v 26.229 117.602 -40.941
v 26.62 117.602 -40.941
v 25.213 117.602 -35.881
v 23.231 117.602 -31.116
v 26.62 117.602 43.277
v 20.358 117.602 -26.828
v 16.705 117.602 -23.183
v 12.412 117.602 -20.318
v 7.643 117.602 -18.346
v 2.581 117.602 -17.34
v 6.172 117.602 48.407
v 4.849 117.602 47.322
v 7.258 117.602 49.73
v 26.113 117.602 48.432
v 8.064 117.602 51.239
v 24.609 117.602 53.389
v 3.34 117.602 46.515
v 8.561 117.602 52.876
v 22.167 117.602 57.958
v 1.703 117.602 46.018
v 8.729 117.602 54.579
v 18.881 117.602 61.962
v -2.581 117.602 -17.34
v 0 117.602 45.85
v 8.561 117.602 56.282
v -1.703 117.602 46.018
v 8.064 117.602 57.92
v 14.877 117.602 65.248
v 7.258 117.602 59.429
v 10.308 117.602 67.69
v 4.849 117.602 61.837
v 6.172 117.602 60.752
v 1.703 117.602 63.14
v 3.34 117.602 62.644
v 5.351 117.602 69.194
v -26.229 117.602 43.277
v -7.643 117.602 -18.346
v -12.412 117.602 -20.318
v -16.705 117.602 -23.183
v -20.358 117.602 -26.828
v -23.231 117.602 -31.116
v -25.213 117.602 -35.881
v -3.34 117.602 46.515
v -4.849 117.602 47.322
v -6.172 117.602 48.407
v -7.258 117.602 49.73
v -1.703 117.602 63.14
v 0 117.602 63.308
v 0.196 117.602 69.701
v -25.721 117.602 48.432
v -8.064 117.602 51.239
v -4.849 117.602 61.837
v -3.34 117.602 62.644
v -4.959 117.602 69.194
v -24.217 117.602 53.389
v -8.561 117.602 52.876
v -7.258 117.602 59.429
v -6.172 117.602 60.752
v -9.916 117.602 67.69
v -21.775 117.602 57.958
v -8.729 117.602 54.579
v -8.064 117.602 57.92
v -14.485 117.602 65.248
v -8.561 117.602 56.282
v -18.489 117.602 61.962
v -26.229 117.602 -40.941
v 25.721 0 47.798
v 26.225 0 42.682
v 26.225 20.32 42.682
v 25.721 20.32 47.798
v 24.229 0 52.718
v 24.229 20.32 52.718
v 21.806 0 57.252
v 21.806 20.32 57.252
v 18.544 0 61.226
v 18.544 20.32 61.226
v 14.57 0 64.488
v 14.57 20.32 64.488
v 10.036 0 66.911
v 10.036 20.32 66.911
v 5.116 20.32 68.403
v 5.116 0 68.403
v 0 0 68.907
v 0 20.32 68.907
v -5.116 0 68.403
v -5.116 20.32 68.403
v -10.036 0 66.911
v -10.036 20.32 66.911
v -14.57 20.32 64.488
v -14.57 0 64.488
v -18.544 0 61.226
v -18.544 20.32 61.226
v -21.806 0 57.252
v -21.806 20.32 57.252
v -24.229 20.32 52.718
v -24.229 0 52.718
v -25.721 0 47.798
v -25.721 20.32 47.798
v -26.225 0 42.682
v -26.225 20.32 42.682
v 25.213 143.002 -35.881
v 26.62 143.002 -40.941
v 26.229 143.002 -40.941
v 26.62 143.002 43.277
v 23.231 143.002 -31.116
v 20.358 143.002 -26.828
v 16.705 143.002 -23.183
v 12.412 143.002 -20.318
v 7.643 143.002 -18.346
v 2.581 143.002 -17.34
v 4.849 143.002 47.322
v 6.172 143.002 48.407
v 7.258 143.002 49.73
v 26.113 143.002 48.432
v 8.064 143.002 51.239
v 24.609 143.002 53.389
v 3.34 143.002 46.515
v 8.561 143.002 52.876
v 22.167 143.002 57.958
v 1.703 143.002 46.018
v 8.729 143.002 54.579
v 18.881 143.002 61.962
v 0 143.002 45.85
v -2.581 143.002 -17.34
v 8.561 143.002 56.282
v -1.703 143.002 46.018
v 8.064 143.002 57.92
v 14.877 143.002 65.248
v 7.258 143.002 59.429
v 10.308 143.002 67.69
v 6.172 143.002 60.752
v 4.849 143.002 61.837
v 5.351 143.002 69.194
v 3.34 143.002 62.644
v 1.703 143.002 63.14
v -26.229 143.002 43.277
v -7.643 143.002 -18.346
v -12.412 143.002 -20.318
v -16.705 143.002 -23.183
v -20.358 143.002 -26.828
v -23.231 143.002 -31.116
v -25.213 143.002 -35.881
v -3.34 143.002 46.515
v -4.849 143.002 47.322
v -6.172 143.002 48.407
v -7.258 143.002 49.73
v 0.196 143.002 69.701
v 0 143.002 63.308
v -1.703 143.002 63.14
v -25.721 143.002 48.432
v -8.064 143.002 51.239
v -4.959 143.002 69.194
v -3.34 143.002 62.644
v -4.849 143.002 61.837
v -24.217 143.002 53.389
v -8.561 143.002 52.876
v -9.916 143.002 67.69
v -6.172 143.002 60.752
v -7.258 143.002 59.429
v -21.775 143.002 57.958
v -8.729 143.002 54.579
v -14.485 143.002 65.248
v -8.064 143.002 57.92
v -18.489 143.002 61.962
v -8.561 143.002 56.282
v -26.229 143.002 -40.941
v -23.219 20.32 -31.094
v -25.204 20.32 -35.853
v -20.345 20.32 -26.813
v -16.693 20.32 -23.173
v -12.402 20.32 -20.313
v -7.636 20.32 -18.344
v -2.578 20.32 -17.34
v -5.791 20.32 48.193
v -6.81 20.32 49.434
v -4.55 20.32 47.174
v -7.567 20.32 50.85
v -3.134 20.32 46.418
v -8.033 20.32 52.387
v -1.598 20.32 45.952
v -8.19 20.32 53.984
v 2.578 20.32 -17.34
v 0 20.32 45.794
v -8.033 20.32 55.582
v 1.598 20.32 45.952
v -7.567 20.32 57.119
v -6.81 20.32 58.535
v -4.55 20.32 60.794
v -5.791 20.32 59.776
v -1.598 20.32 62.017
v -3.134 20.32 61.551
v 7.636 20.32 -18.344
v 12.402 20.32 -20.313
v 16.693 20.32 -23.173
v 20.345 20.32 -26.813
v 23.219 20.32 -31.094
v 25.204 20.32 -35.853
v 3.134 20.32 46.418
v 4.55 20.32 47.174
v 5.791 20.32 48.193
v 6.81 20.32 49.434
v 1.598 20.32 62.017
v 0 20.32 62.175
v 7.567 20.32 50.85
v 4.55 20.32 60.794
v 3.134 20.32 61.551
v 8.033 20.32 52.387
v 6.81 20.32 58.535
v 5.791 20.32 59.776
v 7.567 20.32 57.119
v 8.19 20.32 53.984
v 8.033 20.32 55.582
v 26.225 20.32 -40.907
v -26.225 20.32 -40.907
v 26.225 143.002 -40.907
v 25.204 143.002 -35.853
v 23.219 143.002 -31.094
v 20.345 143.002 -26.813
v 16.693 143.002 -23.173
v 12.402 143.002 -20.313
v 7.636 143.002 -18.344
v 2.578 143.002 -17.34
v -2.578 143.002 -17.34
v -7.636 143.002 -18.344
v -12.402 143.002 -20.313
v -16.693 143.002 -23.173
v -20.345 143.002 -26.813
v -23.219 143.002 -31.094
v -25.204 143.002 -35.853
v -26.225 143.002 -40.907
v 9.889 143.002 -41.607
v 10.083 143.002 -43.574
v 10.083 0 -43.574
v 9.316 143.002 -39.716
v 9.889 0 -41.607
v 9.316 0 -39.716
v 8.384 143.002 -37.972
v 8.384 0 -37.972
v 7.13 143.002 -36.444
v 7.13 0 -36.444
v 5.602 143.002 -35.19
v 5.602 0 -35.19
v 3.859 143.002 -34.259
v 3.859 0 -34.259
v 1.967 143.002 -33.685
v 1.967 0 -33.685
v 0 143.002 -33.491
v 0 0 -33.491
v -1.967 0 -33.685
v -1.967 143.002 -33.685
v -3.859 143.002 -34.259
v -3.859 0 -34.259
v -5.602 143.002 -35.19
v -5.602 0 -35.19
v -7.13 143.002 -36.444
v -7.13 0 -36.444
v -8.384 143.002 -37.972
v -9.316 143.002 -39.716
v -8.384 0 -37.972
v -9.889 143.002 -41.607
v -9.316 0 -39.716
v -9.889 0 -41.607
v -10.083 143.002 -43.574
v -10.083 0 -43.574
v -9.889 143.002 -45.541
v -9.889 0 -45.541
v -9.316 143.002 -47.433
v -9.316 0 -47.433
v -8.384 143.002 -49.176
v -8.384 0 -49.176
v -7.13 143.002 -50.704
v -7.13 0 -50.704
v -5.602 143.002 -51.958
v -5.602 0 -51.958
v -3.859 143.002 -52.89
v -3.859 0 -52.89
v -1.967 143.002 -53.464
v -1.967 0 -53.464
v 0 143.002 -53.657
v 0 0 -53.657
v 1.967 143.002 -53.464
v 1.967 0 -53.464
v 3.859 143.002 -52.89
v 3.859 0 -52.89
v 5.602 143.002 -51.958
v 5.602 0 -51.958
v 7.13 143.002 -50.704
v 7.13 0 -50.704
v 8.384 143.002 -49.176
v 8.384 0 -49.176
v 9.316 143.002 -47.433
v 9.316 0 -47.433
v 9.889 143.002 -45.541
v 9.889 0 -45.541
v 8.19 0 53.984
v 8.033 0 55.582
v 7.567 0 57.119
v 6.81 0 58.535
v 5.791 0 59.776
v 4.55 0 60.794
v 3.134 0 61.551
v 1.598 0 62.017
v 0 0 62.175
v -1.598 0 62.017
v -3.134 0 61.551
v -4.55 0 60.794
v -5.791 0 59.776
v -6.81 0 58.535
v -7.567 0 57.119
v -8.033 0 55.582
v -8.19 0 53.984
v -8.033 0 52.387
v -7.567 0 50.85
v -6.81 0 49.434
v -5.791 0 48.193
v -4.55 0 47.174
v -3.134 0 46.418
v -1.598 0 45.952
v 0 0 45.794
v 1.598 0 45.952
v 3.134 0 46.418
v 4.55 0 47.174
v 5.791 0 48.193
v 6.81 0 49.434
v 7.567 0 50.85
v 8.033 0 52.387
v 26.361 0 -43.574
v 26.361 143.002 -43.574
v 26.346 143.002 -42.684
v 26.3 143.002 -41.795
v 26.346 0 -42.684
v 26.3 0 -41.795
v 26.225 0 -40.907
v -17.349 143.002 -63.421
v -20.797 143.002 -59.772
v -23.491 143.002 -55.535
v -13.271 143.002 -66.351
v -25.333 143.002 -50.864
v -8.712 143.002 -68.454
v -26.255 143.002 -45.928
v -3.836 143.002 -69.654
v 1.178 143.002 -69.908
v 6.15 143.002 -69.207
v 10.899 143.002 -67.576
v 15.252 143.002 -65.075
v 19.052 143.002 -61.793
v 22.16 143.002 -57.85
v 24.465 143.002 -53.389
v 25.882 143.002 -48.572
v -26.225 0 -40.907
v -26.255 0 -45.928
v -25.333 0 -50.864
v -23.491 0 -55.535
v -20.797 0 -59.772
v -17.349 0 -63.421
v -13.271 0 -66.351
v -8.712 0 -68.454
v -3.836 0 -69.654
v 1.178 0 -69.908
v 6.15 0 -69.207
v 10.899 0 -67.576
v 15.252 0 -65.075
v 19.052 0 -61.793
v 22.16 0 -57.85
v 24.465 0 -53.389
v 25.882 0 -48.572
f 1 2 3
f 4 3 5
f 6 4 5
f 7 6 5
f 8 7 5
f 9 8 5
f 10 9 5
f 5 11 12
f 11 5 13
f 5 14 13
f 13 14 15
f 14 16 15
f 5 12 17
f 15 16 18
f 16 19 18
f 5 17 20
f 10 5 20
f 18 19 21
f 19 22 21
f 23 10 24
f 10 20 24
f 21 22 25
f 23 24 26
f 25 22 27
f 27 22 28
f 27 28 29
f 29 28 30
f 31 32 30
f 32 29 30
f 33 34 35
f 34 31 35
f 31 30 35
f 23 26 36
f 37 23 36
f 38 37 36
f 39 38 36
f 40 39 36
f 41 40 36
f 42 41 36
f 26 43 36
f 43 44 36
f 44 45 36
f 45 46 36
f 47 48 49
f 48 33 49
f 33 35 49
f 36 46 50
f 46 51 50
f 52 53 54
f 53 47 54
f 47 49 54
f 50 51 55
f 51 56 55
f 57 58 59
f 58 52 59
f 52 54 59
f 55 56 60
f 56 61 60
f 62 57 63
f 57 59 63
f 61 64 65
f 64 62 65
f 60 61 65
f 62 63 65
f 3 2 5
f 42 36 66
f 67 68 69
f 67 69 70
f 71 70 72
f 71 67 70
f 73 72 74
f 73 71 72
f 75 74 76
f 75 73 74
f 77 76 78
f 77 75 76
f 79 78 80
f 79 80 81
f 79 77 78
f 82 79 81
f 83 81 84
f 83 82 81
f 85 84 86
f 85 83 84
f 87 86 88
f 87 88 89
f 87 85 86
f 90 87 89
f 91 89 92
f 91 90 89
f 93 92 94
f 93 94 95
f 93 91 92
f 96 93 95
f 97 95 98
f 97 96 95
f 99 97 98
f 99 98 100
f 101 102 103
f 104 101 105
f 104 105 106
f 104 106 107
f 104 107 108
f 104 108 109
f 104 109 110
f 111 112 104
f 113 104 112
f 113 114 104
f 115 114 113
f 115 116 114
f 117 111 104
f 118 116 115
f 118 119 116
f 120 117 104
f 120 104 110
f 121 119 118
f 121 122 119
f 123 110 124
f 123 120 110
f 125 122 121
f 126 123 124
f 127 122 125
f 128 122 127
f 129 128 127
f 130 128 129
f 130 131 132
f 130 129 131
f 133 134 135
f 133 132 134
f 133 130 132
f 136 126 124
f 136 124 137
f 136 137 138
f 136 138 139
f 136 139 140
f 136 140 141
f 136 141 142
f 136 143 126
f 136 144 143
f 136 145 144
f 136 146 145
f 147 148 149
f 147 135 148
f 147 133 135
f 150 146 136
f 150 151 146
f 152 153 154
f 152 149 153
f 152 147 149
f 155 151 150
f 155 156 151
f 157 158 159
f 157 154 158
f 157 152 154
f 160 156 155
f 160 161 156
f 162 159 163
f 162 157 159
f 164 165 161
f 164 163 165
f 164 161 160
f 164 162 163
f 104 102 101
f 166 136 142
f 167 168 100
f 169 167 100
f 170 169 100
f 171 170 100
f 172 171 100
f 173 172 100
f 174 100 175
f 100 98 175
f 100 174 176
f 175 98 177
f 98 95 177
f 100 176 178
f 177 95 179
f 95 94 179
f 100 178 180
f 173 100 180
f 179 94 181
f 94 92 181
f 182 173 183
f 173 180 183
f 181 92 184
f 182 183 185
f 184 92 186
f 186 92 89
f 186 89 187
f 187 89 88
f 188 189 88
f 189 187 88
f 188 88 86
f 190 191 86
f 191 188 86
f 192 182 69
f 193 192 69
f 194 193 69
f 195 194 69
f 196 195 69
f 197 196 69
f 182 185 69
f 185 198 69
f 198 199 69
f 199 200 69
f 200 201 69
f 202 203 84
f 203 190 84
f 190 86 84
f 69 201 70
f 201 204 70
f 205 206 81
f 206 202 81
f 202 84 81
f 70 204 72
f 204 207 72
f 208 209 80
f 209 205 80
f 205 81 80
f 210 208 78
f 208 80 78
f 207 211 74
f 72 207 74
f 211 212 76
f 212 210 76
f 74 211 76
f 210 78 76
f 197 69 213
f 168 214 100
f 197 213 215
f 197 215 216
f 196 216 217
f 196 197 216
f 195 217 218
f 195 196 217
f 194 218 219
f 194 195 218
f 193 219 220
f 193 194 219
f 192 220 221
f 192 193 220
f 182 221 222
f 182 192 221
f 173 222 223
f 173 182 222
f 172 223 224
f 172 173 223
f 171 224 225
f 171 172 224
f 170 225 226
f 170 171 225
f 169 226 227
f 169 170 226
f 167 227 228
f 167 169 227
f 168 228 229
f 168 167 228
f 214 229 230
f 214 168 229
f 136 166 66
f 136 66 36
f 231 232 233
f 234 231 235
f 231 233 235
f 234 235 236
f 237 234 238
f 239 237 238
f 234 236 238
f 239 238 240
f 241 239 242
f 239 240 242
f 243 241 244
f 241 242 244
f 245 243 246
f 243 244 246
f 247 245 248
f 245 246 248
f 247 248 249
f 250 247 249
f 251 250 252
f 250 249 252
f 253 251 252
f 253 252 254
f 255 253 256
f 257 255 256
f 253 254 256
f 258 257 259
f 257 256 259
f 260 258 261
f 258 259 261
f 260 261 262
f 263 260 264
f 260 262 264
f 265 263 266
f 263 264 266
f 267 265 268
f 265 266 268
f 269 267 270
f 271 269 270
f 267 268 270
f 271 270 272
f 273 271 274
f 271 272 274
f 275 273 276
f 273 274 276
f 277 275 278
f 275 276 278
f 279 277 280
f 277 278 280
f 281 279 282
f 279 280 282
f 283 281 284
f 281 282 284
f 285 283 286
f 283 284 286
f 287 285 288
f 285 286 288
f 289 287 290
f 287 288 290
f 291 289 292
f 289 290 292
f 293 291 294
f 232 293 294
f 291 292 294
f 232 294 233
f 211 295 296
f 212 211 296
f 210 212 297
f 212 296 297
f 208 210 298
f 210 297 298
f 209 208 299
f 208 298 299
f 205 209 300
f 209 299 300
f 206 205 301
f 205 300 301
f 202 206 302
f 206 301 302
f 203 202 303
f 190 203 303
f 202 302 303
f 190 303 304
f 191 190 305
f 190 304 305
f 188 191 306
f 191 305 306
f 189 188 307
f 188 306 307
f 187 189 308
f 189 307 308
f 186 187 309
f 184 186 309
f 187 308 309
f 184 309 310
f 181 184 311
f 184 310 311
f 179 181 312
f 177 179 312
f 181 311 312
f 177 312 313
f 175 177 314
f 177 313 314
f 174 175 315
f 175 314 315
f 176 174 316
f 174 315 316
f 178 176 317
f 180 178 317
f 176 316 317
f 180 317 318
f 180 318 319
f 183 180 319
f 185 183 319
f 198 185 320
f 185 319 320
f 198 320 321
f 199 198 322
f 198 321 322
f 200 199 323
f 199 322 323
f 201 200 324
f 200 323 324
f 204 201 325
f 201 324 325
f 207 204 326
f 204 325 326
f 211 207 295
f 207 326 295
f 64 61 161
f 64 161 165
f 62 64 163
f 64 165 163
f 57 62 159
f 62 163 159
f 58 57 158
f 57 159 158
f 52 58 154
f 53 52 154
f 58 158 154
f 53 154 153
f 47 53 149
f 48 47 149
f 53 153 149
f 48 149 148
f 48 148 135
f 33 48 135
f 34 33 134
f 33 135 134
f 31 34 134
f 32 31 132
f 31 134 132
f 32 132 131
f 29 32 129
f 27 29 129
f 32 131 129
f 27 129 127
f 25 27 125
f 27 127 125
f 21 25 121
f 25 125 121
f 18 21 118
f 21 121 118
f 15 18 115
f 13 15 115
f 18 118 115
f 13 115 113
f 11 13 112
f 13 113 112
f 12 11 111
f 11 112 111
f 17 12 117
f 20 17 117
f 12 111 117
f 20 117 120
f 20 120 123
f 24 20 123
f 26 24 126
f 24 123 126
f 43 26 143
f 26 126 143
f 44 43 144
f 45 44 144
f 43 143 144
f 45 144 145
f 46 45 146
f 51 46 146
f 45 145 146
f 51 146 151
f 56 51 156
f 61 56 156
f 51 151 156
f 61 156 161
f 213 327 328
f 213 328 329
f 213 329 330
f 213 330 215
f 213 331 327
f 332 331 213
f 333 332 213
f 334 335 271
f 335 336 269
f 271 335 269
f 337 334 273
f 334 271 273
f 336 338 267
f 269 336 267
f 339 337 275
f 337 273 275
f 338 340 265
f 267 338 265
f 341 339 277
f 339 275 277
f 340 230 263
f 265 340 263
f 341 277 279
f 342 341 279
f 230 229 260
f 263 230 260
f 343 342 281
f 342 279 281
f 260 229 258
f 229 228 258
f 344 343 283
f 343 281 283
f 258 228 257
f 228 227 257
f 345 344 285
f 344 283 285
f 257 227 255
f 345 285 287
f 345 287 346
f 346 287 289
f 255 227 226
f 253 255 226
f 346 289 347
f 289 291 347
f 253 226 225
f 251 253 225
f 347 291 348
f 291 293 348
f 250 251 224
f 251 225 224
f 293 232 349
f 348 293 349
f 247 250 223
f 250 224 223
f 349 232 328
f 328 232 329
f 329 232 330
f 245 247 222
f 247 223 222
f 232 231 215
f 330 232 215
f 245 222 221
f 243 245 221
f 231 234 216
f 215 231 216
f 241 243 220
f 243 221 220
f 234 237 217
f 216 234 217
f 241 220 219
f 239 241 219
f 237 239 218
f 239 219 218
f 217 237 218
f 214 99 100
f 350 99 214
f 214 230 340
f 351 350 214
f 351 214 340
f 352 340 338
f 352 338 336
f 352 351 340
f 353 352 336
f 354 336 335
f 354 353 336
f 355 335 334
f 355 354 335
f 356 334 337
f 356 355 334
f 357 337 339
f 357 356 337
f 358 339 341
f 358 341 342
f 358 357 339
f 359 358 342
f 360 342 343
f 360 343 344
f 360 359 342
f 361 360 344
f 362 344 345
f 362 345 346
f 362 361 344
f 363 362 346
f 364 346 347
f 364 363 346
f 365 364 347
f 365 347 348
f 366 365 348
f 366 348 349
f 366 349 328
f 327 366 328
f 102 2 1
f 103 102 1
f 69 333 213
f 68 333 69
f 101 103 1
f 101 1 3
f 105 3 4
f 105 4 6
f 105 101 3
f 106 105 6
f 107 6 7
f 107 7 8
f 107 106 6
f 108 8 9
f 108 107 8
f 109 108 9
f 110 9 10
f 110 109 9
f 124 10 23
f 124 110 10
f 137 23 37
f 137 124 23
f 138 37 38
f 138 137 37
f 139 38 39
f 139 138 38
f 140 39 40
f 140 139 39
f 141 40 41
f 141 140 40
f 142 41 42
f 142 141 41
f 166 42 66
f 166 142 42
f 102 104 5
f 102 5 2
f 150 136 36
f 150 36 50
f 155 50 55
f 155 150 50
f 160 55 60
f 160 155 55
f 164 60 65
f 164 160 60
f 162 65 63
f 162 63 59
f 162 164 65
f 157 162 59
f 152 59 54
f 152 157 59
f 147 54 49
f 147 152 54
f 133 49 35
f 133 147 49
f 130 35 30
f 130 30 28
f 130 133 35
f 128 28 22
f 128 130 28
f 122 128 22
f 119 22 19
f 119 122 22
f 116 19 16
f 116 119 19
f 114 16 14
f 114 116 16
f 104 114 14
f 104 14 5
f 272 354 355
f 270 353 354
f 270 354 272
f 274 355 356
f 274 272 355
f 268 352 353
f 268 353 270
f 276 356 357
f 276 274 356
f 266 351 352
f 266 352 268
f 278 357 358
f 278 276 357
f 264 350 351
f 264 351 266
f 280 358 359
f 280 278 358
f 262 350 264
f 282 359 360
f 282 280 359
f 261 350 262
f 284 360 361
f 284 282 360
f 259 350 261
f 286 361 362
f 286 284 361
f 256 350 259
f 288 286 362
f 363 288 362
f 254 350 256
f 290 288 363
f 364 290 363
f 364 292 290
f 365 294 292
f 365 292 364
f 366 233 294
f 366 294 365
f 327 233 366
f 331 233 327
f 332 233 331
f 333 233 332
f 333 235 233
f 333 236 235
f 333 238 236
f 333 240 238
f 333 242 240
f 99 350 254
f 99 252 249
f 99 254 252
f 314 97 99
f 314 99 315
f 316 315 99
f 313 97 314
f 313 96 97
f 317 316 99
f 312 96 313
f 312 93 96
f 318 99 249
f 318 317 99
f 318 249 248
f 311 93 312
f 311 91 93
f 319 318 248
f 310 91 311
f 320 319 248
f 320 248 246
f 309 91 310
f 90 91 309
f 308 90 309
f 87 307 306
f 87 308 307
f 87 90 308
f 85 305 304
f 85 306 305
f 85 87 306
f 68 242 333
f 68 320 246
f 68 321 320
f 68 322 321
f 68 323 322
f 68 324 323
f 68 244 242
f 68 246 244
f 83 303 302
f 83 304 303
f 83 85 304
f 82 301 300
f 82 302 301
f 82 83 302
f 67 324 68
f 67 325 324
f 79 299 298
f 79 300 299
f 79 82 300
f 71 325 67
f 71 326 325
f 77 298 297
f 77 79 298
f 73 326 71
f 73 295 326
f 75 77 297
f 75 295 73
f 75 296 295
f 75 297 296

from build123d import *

# Parameters (mm, degrees)
F0_R     = 10.083222
F1_DEPTH = 143.002
F0_R_2   = 8.19027
F2_DEPTH = 20.32
F3_R     = 8.728843
F4_DEPTH = 25.4


with BuildPart() as f1:
    # F0 (on Front) → F1 (new body)
    with BuildSketch(Plane.XZ):
        with BuildLine():
            ThreePointArc((-26.225356, -40.907382), (-1.335133, -69.90099), (26.360602, -43.574221))
            ThreePointArc((26.360602, -43.574221), (26.326769, -42.239088), (26.225356, -40.907382))
            ThreePointArc((26.225356, -40.907382), (0, -17.213619), (-26.225356, -40.907382))
        make_face()
        with Locations((0, -43.574221)):
            Circle(F0_R, mode=Mode.SUBTRACT)
    extrude(amount=-F1_DEPTH)

    # F0 (on Front) → F2 (join)
    with BuildSketch(Plane.XZ):
        with BuildLine():
            ThreePointArc((-26.225356, -40.907382), (0, -17.213619), (26.225356, -40.907382))
            Line((26.225356, -40.907382), (26.225356, 42.681914))
            Line((26.225356, 42.681914), (-26.225356, 42.681914))
            Line((-26.225356, 42.681914), (-26.225356, -40.907382))
        make_face()
        with BuildLine():
            Line((-26.225356, 42.681914), (26.225356, 42.681914))
            ThreePointArc((26.225356, 42.681914), (0, 68.90727), (-26.225356, 42.681914))
        make_face()
        with Locations((0, 53.984441)):
            Circle(F0_R_2, mode=Mode.SUBTRACT)
    extrude(amount=-F2_DEPTH)


with BuildPart() as f4:
    # F3 (on face) → F4 (new body)
    with BuildSketch(Plane(origin=(0, 143.002, 0), x_dir=(-1, 0, 0), z_dir=(0, 1, 0))):
        with BuildLine():
            Line((-26.620427, 43.276783), (-26.620427, -40.941327))
            Line((-26.620427, -40.941327), (-26.228786, -40.941327))
            ThreePointArc((-26.228786, -40.941327), (0, -17.213619), (26.228786, -40.941327))
            Line((26.228786, -40.941327), (26.228786, 43.276783))
            ThreePointArc((26.228786, 43.276783), (-0.195821, 69.70139), (-26.620427, 43.276783))
        make_face()
        with Locations((0, 54.579314)):
            Circle(F3_R, mode=Mode.SUBTRACT)
    extrude(amount=-F4_DEPTH)


solid = Compound([f1.part, f4.part])
